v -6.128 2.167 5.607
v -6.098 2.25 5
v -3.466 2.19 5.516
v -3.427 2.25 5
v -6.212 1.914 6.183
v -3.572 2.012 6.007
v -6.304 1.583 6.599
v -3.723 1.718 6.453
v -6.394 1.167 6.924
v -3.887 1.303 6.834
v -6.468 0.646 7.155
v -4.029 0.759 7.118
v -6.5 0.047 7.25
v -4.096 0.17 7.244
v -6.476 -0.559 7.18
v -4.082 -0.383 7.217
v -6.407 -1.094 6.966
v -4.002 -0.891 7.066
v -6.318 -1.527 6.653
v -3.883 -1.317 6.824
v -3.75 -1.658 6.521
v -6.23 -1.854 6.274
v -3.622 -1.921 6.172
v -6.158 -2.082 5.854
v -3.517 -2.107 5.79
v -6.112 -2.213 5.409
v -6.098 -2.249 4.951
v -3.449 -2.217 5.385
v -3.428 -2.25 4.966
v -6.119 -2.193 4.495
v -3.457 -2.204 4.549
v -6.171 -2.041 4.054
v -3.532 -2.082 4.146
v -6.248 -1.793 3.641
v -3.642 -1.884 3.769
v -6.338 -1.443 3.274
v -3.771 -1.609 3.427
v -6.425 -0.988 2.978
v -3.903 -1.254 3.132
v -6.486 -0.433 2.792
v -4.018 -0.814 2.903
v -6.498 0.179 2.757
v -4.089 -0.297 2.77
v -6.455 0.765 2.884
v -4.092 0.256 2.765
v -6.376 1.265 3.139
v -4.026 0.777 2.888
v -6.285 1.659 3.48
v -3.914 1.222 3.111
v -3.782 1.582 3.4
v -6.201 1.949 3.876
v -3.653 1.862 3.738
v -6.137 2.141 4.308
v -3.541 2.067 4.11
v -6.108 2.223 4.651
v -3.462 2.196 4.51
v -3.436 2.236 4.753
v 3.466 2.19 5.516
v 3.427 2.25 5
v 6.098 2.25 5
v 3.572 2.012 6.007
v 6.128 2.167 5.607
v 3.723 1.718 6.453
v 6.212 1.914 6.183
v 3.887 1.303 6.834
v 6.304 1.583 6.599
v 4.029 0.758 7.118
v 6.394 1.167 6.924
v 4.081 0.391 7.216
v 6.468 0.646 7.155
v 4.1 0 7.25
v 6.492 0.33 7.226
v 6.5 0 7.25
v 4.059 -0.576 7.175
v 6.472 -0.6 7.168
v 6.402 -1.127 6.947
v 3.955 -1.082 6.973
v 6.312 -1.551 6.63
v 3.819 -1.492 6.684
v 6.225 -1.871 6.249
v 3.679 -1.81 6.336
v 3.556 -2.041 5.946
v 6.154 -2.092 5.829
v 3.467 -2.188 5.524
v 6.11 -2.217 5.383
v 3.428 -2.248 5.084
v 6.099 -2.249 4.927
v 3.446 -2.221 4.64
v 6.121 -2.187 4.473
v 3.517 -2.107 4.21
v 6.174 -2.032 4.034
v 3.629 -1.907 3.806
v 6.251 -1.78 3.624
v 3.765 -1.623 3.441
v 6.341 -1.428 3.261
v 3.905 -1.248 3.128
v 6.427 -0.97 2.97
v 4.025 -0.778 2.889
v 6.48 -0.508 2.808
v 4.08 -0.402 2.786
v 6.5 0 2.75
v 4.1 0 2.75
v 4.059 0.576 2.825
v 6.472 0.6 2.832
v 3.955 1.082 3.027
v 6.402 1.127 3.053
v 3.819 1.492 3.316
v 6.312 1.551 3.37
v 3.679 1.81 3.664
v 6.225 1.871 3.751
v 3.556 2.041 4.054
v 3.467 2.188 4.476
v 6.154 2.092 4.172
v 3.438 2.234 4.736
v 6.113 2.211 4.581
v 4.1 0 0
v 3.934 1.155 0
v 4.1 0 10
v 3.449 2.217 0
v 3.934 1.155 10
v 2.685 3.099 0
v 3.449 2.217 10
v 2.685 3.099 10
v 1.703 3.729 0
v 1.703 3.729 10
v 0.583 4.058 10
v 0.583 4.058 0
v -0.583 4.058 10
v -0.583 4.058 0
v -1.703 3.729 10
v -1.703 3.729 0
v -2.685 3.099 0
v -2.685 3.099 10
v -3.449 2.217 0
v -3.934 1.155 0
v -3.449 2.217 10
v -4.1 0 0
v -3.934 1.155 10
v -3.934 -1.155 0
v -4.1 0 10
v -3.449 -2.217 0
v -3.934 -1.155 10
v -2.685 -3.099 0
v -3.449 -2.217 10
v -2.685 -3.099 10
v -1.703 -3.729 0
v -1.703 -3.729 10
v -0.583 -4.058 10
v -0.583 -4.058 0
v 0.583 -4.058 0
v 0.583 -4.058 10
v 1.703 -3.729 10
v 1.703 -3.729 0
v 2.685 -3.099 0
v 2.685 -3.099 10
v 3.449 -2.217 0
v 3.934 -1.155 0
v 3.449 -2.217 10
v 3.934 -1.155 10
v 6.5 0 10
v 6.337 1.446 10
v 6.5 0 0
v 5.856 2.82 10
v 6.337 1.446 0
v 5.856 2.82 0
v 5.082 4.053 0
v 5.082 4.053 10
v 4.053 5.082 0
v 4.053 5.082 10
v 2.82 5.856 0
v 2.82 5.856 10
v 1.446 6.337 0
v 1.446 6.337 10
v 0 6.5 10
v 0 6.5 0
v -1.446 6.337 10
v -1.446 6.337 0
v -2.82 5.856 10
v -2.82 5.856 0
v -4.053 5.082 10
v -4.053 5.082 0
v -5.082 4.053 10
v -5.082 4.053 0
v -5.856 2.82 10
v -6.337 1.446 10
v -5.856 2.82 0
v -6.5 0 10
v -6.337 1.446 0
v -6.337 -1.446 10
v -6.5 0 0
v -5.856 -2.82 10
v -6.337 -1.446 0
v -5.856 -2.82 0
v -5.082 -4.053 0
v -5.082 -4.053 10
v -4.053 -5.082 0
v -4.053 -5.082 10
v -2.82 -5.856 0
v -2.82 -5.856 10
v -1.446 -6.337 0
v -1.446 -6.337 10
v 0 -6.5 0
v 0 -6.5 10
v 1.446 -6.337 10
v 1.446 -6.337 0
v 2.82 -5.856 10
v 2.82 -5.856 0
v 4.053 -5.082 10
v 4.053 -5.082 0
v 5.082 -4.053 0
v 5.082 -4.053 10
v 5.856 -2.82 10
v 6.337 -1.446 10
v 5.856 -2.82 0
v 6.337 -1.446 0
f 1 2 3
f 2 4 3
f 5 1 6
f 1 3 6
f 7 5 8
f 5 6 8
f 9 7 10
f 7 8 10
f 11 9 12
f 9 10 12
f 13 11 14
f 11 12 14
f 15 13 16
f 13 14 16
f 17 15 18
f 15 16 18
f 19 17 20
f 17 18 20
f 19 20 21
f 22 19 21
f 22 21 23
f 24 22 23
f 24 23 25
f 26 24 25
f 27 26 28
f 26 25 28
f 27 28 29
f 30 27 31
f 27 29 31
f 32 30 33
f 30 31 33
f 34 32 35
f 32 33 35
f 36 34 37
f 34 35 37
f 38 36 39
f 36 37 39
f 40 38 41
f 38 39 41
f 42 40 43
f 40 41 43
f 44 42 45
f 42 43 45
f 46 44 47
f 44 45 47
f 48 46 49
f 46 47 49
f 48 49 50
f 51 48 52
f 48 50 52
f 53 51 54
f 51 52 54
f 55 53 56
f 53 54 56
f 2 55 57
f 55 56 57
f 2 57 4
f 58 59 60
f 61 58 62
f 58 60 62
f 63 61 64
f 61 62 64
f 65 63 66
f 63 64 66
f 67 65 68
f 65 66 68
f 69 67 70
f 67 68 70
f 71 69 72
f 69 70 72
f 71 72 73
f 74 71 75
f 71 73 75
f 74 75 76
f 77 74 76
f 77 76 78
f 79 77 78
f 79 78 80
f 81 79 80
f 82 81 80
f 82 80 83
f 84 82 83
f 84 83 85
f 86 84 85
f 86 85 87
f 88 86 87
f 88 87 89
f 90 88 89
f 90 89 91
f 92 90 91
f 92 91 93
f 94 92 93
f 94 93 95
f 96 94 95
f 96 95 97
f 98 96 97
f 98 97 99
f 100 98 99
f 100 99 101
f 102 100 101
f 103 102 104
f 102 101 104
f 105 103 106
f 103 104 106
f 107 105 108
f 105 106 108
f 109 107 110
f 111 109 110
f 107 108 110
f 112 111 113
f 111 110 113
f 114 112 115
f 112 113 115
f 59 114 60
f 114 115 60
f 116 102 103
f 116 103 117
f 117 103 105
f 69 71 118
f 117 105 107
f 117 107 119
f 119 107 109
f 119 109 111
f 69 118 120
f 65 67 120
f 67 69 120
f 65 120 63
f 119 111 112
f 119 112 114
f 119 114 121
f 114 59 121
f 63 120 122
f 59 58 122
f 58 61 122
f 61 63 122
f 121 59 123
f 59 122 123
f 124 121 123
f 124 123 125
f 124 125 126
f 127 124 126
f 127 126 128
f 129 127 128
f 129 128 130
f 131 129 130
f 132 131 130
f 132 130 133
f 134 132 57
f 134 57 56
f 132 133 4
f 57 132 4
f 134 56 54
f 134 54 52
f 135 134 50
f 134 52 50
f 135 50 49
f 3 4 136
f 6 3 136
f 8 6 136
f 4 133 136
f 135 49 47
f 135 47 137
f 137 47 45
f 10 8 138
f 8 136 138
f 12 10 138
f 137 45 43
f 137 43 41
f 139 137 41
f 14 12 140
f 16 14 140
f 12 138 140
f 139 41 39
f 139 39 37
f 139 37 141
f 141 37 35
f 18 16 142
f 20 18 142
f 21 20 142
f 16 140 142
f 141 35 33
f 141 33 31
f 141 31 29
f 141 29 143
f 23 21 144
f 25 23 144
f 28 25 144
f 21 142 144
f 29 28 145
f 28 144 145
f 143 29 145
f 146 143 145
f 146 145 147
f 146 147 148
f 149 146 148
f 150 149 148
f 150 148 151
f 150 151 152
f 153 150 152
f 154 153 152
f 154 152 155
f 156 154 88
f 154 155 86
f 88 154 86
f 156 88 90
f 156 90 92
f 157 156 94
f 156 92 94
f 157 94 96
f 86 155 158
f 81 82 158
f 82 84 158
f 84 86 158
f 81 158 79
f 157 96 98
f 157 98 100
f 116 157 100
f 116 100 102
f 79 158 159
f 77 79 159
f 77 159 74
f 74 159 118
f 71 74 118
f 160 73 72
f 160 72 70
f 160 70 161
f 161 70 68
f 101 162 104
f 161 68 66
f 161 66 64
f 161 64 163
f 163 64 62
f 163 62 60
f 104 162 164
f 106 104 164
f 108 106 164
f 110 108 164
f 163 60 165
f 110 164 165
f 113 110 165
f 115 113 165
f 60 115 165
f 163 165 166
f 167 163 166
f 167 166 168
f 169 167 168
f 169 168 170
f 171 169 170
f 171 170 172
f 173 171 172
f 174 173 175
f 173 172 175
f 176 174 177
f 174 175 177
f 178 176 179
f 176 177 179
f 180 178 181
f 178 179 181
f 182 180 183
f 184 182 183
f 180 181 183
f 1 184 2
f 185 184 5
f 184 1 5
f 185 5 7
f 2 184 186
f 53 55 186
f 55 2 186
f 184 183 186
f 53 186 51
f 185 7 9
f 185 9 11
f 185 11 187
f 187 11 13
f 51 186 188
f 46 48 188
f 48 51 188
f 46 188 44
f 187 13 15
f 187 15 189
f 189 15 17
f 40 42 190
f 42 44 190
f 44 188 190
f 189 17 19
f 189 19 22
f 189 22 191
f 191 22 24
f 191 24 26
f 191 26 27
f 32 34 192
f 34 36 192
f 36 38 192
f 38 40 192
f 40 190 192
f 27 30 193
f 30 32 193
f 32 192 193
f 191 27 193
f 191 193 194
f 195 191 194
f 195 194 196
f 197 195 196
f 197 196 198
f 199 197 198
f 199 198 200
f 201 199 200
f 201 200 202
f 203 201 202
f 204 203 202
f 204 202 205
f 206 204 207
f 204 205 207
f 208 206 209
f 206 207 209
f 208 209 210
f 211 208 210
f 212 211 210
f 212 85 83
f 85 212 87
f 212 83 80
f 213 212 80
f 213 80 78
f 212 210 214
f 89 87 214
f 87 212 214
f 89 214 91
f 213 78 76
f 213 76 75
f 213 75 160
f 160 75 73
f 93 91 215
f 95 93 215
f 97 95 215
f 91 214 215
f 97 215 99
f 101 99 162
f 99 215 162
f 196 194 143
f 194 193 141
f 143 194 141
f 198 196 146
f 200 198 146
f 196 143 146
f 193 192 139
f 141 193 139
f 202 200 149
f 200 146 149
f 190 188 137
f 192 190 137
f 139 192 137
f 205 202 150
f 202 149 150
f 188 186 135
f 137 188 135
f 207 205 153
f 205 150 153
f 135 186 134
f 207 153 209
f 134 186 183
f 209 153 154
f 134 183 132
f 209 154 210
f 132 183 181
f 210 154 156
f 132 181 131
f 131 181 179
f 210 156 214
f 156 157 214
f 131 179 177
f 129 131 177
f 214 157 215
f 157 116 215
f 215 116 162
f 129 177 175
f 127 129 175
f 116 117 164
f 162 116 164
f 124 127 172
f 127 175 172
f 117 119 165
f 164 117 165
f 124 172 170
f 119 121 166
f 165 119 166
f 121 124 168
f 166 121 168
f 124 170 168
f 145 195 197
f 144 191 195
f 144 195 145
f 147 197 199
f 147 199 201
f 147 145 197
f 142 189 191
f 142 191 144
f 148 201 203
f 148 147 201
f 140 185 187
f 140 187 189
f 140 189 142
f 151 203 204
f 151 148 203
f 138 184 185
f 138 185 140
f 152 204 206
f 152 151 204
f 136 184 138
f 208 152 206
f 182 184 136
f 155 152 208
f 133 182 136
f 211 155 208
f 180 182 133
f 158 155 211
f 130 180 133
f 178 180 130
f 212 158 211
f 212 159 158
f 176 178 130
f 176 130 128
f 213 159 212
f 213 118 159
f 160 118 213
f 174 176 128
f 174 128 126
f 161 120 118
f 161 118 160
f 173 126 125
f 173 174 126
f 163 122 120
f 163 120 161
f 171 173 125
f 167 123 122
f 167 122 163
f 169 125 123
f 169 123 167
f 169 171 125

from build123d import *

# Parameters (mm, degrees)
F0_R     = 6.5
F1_DEPTH = 10
F2_R     = 4.1
F3_DEPTH = 10
F4_R     = 2.25
F5_DEPTH = 12.5


with BuildPart() as f1:
    # F0 (on Top) → F1 (new body)
    with BuildSketch(Plane.XY):
        Circle(F0_R)
    extrude(amount=F1_DEPTH)

    # F2 (on face) → F3 (cut)
    with BuildSketch(Plane.XY.offset(10)):
        Circle(F2_R)
    extrude(amount=-F3_DEPTH, mode=Mode.SUBTRACT)

    # F4 (on Right) → F5 (cut, symmetric)
    with BuildSketch(Plane.YZ):
        with Locations((0, 5)):
            Circle(F4_R)
    extrude(amount=F5_DEPTH, both=True, mode=Mode.SUBTRACT)


solid = f1.part
